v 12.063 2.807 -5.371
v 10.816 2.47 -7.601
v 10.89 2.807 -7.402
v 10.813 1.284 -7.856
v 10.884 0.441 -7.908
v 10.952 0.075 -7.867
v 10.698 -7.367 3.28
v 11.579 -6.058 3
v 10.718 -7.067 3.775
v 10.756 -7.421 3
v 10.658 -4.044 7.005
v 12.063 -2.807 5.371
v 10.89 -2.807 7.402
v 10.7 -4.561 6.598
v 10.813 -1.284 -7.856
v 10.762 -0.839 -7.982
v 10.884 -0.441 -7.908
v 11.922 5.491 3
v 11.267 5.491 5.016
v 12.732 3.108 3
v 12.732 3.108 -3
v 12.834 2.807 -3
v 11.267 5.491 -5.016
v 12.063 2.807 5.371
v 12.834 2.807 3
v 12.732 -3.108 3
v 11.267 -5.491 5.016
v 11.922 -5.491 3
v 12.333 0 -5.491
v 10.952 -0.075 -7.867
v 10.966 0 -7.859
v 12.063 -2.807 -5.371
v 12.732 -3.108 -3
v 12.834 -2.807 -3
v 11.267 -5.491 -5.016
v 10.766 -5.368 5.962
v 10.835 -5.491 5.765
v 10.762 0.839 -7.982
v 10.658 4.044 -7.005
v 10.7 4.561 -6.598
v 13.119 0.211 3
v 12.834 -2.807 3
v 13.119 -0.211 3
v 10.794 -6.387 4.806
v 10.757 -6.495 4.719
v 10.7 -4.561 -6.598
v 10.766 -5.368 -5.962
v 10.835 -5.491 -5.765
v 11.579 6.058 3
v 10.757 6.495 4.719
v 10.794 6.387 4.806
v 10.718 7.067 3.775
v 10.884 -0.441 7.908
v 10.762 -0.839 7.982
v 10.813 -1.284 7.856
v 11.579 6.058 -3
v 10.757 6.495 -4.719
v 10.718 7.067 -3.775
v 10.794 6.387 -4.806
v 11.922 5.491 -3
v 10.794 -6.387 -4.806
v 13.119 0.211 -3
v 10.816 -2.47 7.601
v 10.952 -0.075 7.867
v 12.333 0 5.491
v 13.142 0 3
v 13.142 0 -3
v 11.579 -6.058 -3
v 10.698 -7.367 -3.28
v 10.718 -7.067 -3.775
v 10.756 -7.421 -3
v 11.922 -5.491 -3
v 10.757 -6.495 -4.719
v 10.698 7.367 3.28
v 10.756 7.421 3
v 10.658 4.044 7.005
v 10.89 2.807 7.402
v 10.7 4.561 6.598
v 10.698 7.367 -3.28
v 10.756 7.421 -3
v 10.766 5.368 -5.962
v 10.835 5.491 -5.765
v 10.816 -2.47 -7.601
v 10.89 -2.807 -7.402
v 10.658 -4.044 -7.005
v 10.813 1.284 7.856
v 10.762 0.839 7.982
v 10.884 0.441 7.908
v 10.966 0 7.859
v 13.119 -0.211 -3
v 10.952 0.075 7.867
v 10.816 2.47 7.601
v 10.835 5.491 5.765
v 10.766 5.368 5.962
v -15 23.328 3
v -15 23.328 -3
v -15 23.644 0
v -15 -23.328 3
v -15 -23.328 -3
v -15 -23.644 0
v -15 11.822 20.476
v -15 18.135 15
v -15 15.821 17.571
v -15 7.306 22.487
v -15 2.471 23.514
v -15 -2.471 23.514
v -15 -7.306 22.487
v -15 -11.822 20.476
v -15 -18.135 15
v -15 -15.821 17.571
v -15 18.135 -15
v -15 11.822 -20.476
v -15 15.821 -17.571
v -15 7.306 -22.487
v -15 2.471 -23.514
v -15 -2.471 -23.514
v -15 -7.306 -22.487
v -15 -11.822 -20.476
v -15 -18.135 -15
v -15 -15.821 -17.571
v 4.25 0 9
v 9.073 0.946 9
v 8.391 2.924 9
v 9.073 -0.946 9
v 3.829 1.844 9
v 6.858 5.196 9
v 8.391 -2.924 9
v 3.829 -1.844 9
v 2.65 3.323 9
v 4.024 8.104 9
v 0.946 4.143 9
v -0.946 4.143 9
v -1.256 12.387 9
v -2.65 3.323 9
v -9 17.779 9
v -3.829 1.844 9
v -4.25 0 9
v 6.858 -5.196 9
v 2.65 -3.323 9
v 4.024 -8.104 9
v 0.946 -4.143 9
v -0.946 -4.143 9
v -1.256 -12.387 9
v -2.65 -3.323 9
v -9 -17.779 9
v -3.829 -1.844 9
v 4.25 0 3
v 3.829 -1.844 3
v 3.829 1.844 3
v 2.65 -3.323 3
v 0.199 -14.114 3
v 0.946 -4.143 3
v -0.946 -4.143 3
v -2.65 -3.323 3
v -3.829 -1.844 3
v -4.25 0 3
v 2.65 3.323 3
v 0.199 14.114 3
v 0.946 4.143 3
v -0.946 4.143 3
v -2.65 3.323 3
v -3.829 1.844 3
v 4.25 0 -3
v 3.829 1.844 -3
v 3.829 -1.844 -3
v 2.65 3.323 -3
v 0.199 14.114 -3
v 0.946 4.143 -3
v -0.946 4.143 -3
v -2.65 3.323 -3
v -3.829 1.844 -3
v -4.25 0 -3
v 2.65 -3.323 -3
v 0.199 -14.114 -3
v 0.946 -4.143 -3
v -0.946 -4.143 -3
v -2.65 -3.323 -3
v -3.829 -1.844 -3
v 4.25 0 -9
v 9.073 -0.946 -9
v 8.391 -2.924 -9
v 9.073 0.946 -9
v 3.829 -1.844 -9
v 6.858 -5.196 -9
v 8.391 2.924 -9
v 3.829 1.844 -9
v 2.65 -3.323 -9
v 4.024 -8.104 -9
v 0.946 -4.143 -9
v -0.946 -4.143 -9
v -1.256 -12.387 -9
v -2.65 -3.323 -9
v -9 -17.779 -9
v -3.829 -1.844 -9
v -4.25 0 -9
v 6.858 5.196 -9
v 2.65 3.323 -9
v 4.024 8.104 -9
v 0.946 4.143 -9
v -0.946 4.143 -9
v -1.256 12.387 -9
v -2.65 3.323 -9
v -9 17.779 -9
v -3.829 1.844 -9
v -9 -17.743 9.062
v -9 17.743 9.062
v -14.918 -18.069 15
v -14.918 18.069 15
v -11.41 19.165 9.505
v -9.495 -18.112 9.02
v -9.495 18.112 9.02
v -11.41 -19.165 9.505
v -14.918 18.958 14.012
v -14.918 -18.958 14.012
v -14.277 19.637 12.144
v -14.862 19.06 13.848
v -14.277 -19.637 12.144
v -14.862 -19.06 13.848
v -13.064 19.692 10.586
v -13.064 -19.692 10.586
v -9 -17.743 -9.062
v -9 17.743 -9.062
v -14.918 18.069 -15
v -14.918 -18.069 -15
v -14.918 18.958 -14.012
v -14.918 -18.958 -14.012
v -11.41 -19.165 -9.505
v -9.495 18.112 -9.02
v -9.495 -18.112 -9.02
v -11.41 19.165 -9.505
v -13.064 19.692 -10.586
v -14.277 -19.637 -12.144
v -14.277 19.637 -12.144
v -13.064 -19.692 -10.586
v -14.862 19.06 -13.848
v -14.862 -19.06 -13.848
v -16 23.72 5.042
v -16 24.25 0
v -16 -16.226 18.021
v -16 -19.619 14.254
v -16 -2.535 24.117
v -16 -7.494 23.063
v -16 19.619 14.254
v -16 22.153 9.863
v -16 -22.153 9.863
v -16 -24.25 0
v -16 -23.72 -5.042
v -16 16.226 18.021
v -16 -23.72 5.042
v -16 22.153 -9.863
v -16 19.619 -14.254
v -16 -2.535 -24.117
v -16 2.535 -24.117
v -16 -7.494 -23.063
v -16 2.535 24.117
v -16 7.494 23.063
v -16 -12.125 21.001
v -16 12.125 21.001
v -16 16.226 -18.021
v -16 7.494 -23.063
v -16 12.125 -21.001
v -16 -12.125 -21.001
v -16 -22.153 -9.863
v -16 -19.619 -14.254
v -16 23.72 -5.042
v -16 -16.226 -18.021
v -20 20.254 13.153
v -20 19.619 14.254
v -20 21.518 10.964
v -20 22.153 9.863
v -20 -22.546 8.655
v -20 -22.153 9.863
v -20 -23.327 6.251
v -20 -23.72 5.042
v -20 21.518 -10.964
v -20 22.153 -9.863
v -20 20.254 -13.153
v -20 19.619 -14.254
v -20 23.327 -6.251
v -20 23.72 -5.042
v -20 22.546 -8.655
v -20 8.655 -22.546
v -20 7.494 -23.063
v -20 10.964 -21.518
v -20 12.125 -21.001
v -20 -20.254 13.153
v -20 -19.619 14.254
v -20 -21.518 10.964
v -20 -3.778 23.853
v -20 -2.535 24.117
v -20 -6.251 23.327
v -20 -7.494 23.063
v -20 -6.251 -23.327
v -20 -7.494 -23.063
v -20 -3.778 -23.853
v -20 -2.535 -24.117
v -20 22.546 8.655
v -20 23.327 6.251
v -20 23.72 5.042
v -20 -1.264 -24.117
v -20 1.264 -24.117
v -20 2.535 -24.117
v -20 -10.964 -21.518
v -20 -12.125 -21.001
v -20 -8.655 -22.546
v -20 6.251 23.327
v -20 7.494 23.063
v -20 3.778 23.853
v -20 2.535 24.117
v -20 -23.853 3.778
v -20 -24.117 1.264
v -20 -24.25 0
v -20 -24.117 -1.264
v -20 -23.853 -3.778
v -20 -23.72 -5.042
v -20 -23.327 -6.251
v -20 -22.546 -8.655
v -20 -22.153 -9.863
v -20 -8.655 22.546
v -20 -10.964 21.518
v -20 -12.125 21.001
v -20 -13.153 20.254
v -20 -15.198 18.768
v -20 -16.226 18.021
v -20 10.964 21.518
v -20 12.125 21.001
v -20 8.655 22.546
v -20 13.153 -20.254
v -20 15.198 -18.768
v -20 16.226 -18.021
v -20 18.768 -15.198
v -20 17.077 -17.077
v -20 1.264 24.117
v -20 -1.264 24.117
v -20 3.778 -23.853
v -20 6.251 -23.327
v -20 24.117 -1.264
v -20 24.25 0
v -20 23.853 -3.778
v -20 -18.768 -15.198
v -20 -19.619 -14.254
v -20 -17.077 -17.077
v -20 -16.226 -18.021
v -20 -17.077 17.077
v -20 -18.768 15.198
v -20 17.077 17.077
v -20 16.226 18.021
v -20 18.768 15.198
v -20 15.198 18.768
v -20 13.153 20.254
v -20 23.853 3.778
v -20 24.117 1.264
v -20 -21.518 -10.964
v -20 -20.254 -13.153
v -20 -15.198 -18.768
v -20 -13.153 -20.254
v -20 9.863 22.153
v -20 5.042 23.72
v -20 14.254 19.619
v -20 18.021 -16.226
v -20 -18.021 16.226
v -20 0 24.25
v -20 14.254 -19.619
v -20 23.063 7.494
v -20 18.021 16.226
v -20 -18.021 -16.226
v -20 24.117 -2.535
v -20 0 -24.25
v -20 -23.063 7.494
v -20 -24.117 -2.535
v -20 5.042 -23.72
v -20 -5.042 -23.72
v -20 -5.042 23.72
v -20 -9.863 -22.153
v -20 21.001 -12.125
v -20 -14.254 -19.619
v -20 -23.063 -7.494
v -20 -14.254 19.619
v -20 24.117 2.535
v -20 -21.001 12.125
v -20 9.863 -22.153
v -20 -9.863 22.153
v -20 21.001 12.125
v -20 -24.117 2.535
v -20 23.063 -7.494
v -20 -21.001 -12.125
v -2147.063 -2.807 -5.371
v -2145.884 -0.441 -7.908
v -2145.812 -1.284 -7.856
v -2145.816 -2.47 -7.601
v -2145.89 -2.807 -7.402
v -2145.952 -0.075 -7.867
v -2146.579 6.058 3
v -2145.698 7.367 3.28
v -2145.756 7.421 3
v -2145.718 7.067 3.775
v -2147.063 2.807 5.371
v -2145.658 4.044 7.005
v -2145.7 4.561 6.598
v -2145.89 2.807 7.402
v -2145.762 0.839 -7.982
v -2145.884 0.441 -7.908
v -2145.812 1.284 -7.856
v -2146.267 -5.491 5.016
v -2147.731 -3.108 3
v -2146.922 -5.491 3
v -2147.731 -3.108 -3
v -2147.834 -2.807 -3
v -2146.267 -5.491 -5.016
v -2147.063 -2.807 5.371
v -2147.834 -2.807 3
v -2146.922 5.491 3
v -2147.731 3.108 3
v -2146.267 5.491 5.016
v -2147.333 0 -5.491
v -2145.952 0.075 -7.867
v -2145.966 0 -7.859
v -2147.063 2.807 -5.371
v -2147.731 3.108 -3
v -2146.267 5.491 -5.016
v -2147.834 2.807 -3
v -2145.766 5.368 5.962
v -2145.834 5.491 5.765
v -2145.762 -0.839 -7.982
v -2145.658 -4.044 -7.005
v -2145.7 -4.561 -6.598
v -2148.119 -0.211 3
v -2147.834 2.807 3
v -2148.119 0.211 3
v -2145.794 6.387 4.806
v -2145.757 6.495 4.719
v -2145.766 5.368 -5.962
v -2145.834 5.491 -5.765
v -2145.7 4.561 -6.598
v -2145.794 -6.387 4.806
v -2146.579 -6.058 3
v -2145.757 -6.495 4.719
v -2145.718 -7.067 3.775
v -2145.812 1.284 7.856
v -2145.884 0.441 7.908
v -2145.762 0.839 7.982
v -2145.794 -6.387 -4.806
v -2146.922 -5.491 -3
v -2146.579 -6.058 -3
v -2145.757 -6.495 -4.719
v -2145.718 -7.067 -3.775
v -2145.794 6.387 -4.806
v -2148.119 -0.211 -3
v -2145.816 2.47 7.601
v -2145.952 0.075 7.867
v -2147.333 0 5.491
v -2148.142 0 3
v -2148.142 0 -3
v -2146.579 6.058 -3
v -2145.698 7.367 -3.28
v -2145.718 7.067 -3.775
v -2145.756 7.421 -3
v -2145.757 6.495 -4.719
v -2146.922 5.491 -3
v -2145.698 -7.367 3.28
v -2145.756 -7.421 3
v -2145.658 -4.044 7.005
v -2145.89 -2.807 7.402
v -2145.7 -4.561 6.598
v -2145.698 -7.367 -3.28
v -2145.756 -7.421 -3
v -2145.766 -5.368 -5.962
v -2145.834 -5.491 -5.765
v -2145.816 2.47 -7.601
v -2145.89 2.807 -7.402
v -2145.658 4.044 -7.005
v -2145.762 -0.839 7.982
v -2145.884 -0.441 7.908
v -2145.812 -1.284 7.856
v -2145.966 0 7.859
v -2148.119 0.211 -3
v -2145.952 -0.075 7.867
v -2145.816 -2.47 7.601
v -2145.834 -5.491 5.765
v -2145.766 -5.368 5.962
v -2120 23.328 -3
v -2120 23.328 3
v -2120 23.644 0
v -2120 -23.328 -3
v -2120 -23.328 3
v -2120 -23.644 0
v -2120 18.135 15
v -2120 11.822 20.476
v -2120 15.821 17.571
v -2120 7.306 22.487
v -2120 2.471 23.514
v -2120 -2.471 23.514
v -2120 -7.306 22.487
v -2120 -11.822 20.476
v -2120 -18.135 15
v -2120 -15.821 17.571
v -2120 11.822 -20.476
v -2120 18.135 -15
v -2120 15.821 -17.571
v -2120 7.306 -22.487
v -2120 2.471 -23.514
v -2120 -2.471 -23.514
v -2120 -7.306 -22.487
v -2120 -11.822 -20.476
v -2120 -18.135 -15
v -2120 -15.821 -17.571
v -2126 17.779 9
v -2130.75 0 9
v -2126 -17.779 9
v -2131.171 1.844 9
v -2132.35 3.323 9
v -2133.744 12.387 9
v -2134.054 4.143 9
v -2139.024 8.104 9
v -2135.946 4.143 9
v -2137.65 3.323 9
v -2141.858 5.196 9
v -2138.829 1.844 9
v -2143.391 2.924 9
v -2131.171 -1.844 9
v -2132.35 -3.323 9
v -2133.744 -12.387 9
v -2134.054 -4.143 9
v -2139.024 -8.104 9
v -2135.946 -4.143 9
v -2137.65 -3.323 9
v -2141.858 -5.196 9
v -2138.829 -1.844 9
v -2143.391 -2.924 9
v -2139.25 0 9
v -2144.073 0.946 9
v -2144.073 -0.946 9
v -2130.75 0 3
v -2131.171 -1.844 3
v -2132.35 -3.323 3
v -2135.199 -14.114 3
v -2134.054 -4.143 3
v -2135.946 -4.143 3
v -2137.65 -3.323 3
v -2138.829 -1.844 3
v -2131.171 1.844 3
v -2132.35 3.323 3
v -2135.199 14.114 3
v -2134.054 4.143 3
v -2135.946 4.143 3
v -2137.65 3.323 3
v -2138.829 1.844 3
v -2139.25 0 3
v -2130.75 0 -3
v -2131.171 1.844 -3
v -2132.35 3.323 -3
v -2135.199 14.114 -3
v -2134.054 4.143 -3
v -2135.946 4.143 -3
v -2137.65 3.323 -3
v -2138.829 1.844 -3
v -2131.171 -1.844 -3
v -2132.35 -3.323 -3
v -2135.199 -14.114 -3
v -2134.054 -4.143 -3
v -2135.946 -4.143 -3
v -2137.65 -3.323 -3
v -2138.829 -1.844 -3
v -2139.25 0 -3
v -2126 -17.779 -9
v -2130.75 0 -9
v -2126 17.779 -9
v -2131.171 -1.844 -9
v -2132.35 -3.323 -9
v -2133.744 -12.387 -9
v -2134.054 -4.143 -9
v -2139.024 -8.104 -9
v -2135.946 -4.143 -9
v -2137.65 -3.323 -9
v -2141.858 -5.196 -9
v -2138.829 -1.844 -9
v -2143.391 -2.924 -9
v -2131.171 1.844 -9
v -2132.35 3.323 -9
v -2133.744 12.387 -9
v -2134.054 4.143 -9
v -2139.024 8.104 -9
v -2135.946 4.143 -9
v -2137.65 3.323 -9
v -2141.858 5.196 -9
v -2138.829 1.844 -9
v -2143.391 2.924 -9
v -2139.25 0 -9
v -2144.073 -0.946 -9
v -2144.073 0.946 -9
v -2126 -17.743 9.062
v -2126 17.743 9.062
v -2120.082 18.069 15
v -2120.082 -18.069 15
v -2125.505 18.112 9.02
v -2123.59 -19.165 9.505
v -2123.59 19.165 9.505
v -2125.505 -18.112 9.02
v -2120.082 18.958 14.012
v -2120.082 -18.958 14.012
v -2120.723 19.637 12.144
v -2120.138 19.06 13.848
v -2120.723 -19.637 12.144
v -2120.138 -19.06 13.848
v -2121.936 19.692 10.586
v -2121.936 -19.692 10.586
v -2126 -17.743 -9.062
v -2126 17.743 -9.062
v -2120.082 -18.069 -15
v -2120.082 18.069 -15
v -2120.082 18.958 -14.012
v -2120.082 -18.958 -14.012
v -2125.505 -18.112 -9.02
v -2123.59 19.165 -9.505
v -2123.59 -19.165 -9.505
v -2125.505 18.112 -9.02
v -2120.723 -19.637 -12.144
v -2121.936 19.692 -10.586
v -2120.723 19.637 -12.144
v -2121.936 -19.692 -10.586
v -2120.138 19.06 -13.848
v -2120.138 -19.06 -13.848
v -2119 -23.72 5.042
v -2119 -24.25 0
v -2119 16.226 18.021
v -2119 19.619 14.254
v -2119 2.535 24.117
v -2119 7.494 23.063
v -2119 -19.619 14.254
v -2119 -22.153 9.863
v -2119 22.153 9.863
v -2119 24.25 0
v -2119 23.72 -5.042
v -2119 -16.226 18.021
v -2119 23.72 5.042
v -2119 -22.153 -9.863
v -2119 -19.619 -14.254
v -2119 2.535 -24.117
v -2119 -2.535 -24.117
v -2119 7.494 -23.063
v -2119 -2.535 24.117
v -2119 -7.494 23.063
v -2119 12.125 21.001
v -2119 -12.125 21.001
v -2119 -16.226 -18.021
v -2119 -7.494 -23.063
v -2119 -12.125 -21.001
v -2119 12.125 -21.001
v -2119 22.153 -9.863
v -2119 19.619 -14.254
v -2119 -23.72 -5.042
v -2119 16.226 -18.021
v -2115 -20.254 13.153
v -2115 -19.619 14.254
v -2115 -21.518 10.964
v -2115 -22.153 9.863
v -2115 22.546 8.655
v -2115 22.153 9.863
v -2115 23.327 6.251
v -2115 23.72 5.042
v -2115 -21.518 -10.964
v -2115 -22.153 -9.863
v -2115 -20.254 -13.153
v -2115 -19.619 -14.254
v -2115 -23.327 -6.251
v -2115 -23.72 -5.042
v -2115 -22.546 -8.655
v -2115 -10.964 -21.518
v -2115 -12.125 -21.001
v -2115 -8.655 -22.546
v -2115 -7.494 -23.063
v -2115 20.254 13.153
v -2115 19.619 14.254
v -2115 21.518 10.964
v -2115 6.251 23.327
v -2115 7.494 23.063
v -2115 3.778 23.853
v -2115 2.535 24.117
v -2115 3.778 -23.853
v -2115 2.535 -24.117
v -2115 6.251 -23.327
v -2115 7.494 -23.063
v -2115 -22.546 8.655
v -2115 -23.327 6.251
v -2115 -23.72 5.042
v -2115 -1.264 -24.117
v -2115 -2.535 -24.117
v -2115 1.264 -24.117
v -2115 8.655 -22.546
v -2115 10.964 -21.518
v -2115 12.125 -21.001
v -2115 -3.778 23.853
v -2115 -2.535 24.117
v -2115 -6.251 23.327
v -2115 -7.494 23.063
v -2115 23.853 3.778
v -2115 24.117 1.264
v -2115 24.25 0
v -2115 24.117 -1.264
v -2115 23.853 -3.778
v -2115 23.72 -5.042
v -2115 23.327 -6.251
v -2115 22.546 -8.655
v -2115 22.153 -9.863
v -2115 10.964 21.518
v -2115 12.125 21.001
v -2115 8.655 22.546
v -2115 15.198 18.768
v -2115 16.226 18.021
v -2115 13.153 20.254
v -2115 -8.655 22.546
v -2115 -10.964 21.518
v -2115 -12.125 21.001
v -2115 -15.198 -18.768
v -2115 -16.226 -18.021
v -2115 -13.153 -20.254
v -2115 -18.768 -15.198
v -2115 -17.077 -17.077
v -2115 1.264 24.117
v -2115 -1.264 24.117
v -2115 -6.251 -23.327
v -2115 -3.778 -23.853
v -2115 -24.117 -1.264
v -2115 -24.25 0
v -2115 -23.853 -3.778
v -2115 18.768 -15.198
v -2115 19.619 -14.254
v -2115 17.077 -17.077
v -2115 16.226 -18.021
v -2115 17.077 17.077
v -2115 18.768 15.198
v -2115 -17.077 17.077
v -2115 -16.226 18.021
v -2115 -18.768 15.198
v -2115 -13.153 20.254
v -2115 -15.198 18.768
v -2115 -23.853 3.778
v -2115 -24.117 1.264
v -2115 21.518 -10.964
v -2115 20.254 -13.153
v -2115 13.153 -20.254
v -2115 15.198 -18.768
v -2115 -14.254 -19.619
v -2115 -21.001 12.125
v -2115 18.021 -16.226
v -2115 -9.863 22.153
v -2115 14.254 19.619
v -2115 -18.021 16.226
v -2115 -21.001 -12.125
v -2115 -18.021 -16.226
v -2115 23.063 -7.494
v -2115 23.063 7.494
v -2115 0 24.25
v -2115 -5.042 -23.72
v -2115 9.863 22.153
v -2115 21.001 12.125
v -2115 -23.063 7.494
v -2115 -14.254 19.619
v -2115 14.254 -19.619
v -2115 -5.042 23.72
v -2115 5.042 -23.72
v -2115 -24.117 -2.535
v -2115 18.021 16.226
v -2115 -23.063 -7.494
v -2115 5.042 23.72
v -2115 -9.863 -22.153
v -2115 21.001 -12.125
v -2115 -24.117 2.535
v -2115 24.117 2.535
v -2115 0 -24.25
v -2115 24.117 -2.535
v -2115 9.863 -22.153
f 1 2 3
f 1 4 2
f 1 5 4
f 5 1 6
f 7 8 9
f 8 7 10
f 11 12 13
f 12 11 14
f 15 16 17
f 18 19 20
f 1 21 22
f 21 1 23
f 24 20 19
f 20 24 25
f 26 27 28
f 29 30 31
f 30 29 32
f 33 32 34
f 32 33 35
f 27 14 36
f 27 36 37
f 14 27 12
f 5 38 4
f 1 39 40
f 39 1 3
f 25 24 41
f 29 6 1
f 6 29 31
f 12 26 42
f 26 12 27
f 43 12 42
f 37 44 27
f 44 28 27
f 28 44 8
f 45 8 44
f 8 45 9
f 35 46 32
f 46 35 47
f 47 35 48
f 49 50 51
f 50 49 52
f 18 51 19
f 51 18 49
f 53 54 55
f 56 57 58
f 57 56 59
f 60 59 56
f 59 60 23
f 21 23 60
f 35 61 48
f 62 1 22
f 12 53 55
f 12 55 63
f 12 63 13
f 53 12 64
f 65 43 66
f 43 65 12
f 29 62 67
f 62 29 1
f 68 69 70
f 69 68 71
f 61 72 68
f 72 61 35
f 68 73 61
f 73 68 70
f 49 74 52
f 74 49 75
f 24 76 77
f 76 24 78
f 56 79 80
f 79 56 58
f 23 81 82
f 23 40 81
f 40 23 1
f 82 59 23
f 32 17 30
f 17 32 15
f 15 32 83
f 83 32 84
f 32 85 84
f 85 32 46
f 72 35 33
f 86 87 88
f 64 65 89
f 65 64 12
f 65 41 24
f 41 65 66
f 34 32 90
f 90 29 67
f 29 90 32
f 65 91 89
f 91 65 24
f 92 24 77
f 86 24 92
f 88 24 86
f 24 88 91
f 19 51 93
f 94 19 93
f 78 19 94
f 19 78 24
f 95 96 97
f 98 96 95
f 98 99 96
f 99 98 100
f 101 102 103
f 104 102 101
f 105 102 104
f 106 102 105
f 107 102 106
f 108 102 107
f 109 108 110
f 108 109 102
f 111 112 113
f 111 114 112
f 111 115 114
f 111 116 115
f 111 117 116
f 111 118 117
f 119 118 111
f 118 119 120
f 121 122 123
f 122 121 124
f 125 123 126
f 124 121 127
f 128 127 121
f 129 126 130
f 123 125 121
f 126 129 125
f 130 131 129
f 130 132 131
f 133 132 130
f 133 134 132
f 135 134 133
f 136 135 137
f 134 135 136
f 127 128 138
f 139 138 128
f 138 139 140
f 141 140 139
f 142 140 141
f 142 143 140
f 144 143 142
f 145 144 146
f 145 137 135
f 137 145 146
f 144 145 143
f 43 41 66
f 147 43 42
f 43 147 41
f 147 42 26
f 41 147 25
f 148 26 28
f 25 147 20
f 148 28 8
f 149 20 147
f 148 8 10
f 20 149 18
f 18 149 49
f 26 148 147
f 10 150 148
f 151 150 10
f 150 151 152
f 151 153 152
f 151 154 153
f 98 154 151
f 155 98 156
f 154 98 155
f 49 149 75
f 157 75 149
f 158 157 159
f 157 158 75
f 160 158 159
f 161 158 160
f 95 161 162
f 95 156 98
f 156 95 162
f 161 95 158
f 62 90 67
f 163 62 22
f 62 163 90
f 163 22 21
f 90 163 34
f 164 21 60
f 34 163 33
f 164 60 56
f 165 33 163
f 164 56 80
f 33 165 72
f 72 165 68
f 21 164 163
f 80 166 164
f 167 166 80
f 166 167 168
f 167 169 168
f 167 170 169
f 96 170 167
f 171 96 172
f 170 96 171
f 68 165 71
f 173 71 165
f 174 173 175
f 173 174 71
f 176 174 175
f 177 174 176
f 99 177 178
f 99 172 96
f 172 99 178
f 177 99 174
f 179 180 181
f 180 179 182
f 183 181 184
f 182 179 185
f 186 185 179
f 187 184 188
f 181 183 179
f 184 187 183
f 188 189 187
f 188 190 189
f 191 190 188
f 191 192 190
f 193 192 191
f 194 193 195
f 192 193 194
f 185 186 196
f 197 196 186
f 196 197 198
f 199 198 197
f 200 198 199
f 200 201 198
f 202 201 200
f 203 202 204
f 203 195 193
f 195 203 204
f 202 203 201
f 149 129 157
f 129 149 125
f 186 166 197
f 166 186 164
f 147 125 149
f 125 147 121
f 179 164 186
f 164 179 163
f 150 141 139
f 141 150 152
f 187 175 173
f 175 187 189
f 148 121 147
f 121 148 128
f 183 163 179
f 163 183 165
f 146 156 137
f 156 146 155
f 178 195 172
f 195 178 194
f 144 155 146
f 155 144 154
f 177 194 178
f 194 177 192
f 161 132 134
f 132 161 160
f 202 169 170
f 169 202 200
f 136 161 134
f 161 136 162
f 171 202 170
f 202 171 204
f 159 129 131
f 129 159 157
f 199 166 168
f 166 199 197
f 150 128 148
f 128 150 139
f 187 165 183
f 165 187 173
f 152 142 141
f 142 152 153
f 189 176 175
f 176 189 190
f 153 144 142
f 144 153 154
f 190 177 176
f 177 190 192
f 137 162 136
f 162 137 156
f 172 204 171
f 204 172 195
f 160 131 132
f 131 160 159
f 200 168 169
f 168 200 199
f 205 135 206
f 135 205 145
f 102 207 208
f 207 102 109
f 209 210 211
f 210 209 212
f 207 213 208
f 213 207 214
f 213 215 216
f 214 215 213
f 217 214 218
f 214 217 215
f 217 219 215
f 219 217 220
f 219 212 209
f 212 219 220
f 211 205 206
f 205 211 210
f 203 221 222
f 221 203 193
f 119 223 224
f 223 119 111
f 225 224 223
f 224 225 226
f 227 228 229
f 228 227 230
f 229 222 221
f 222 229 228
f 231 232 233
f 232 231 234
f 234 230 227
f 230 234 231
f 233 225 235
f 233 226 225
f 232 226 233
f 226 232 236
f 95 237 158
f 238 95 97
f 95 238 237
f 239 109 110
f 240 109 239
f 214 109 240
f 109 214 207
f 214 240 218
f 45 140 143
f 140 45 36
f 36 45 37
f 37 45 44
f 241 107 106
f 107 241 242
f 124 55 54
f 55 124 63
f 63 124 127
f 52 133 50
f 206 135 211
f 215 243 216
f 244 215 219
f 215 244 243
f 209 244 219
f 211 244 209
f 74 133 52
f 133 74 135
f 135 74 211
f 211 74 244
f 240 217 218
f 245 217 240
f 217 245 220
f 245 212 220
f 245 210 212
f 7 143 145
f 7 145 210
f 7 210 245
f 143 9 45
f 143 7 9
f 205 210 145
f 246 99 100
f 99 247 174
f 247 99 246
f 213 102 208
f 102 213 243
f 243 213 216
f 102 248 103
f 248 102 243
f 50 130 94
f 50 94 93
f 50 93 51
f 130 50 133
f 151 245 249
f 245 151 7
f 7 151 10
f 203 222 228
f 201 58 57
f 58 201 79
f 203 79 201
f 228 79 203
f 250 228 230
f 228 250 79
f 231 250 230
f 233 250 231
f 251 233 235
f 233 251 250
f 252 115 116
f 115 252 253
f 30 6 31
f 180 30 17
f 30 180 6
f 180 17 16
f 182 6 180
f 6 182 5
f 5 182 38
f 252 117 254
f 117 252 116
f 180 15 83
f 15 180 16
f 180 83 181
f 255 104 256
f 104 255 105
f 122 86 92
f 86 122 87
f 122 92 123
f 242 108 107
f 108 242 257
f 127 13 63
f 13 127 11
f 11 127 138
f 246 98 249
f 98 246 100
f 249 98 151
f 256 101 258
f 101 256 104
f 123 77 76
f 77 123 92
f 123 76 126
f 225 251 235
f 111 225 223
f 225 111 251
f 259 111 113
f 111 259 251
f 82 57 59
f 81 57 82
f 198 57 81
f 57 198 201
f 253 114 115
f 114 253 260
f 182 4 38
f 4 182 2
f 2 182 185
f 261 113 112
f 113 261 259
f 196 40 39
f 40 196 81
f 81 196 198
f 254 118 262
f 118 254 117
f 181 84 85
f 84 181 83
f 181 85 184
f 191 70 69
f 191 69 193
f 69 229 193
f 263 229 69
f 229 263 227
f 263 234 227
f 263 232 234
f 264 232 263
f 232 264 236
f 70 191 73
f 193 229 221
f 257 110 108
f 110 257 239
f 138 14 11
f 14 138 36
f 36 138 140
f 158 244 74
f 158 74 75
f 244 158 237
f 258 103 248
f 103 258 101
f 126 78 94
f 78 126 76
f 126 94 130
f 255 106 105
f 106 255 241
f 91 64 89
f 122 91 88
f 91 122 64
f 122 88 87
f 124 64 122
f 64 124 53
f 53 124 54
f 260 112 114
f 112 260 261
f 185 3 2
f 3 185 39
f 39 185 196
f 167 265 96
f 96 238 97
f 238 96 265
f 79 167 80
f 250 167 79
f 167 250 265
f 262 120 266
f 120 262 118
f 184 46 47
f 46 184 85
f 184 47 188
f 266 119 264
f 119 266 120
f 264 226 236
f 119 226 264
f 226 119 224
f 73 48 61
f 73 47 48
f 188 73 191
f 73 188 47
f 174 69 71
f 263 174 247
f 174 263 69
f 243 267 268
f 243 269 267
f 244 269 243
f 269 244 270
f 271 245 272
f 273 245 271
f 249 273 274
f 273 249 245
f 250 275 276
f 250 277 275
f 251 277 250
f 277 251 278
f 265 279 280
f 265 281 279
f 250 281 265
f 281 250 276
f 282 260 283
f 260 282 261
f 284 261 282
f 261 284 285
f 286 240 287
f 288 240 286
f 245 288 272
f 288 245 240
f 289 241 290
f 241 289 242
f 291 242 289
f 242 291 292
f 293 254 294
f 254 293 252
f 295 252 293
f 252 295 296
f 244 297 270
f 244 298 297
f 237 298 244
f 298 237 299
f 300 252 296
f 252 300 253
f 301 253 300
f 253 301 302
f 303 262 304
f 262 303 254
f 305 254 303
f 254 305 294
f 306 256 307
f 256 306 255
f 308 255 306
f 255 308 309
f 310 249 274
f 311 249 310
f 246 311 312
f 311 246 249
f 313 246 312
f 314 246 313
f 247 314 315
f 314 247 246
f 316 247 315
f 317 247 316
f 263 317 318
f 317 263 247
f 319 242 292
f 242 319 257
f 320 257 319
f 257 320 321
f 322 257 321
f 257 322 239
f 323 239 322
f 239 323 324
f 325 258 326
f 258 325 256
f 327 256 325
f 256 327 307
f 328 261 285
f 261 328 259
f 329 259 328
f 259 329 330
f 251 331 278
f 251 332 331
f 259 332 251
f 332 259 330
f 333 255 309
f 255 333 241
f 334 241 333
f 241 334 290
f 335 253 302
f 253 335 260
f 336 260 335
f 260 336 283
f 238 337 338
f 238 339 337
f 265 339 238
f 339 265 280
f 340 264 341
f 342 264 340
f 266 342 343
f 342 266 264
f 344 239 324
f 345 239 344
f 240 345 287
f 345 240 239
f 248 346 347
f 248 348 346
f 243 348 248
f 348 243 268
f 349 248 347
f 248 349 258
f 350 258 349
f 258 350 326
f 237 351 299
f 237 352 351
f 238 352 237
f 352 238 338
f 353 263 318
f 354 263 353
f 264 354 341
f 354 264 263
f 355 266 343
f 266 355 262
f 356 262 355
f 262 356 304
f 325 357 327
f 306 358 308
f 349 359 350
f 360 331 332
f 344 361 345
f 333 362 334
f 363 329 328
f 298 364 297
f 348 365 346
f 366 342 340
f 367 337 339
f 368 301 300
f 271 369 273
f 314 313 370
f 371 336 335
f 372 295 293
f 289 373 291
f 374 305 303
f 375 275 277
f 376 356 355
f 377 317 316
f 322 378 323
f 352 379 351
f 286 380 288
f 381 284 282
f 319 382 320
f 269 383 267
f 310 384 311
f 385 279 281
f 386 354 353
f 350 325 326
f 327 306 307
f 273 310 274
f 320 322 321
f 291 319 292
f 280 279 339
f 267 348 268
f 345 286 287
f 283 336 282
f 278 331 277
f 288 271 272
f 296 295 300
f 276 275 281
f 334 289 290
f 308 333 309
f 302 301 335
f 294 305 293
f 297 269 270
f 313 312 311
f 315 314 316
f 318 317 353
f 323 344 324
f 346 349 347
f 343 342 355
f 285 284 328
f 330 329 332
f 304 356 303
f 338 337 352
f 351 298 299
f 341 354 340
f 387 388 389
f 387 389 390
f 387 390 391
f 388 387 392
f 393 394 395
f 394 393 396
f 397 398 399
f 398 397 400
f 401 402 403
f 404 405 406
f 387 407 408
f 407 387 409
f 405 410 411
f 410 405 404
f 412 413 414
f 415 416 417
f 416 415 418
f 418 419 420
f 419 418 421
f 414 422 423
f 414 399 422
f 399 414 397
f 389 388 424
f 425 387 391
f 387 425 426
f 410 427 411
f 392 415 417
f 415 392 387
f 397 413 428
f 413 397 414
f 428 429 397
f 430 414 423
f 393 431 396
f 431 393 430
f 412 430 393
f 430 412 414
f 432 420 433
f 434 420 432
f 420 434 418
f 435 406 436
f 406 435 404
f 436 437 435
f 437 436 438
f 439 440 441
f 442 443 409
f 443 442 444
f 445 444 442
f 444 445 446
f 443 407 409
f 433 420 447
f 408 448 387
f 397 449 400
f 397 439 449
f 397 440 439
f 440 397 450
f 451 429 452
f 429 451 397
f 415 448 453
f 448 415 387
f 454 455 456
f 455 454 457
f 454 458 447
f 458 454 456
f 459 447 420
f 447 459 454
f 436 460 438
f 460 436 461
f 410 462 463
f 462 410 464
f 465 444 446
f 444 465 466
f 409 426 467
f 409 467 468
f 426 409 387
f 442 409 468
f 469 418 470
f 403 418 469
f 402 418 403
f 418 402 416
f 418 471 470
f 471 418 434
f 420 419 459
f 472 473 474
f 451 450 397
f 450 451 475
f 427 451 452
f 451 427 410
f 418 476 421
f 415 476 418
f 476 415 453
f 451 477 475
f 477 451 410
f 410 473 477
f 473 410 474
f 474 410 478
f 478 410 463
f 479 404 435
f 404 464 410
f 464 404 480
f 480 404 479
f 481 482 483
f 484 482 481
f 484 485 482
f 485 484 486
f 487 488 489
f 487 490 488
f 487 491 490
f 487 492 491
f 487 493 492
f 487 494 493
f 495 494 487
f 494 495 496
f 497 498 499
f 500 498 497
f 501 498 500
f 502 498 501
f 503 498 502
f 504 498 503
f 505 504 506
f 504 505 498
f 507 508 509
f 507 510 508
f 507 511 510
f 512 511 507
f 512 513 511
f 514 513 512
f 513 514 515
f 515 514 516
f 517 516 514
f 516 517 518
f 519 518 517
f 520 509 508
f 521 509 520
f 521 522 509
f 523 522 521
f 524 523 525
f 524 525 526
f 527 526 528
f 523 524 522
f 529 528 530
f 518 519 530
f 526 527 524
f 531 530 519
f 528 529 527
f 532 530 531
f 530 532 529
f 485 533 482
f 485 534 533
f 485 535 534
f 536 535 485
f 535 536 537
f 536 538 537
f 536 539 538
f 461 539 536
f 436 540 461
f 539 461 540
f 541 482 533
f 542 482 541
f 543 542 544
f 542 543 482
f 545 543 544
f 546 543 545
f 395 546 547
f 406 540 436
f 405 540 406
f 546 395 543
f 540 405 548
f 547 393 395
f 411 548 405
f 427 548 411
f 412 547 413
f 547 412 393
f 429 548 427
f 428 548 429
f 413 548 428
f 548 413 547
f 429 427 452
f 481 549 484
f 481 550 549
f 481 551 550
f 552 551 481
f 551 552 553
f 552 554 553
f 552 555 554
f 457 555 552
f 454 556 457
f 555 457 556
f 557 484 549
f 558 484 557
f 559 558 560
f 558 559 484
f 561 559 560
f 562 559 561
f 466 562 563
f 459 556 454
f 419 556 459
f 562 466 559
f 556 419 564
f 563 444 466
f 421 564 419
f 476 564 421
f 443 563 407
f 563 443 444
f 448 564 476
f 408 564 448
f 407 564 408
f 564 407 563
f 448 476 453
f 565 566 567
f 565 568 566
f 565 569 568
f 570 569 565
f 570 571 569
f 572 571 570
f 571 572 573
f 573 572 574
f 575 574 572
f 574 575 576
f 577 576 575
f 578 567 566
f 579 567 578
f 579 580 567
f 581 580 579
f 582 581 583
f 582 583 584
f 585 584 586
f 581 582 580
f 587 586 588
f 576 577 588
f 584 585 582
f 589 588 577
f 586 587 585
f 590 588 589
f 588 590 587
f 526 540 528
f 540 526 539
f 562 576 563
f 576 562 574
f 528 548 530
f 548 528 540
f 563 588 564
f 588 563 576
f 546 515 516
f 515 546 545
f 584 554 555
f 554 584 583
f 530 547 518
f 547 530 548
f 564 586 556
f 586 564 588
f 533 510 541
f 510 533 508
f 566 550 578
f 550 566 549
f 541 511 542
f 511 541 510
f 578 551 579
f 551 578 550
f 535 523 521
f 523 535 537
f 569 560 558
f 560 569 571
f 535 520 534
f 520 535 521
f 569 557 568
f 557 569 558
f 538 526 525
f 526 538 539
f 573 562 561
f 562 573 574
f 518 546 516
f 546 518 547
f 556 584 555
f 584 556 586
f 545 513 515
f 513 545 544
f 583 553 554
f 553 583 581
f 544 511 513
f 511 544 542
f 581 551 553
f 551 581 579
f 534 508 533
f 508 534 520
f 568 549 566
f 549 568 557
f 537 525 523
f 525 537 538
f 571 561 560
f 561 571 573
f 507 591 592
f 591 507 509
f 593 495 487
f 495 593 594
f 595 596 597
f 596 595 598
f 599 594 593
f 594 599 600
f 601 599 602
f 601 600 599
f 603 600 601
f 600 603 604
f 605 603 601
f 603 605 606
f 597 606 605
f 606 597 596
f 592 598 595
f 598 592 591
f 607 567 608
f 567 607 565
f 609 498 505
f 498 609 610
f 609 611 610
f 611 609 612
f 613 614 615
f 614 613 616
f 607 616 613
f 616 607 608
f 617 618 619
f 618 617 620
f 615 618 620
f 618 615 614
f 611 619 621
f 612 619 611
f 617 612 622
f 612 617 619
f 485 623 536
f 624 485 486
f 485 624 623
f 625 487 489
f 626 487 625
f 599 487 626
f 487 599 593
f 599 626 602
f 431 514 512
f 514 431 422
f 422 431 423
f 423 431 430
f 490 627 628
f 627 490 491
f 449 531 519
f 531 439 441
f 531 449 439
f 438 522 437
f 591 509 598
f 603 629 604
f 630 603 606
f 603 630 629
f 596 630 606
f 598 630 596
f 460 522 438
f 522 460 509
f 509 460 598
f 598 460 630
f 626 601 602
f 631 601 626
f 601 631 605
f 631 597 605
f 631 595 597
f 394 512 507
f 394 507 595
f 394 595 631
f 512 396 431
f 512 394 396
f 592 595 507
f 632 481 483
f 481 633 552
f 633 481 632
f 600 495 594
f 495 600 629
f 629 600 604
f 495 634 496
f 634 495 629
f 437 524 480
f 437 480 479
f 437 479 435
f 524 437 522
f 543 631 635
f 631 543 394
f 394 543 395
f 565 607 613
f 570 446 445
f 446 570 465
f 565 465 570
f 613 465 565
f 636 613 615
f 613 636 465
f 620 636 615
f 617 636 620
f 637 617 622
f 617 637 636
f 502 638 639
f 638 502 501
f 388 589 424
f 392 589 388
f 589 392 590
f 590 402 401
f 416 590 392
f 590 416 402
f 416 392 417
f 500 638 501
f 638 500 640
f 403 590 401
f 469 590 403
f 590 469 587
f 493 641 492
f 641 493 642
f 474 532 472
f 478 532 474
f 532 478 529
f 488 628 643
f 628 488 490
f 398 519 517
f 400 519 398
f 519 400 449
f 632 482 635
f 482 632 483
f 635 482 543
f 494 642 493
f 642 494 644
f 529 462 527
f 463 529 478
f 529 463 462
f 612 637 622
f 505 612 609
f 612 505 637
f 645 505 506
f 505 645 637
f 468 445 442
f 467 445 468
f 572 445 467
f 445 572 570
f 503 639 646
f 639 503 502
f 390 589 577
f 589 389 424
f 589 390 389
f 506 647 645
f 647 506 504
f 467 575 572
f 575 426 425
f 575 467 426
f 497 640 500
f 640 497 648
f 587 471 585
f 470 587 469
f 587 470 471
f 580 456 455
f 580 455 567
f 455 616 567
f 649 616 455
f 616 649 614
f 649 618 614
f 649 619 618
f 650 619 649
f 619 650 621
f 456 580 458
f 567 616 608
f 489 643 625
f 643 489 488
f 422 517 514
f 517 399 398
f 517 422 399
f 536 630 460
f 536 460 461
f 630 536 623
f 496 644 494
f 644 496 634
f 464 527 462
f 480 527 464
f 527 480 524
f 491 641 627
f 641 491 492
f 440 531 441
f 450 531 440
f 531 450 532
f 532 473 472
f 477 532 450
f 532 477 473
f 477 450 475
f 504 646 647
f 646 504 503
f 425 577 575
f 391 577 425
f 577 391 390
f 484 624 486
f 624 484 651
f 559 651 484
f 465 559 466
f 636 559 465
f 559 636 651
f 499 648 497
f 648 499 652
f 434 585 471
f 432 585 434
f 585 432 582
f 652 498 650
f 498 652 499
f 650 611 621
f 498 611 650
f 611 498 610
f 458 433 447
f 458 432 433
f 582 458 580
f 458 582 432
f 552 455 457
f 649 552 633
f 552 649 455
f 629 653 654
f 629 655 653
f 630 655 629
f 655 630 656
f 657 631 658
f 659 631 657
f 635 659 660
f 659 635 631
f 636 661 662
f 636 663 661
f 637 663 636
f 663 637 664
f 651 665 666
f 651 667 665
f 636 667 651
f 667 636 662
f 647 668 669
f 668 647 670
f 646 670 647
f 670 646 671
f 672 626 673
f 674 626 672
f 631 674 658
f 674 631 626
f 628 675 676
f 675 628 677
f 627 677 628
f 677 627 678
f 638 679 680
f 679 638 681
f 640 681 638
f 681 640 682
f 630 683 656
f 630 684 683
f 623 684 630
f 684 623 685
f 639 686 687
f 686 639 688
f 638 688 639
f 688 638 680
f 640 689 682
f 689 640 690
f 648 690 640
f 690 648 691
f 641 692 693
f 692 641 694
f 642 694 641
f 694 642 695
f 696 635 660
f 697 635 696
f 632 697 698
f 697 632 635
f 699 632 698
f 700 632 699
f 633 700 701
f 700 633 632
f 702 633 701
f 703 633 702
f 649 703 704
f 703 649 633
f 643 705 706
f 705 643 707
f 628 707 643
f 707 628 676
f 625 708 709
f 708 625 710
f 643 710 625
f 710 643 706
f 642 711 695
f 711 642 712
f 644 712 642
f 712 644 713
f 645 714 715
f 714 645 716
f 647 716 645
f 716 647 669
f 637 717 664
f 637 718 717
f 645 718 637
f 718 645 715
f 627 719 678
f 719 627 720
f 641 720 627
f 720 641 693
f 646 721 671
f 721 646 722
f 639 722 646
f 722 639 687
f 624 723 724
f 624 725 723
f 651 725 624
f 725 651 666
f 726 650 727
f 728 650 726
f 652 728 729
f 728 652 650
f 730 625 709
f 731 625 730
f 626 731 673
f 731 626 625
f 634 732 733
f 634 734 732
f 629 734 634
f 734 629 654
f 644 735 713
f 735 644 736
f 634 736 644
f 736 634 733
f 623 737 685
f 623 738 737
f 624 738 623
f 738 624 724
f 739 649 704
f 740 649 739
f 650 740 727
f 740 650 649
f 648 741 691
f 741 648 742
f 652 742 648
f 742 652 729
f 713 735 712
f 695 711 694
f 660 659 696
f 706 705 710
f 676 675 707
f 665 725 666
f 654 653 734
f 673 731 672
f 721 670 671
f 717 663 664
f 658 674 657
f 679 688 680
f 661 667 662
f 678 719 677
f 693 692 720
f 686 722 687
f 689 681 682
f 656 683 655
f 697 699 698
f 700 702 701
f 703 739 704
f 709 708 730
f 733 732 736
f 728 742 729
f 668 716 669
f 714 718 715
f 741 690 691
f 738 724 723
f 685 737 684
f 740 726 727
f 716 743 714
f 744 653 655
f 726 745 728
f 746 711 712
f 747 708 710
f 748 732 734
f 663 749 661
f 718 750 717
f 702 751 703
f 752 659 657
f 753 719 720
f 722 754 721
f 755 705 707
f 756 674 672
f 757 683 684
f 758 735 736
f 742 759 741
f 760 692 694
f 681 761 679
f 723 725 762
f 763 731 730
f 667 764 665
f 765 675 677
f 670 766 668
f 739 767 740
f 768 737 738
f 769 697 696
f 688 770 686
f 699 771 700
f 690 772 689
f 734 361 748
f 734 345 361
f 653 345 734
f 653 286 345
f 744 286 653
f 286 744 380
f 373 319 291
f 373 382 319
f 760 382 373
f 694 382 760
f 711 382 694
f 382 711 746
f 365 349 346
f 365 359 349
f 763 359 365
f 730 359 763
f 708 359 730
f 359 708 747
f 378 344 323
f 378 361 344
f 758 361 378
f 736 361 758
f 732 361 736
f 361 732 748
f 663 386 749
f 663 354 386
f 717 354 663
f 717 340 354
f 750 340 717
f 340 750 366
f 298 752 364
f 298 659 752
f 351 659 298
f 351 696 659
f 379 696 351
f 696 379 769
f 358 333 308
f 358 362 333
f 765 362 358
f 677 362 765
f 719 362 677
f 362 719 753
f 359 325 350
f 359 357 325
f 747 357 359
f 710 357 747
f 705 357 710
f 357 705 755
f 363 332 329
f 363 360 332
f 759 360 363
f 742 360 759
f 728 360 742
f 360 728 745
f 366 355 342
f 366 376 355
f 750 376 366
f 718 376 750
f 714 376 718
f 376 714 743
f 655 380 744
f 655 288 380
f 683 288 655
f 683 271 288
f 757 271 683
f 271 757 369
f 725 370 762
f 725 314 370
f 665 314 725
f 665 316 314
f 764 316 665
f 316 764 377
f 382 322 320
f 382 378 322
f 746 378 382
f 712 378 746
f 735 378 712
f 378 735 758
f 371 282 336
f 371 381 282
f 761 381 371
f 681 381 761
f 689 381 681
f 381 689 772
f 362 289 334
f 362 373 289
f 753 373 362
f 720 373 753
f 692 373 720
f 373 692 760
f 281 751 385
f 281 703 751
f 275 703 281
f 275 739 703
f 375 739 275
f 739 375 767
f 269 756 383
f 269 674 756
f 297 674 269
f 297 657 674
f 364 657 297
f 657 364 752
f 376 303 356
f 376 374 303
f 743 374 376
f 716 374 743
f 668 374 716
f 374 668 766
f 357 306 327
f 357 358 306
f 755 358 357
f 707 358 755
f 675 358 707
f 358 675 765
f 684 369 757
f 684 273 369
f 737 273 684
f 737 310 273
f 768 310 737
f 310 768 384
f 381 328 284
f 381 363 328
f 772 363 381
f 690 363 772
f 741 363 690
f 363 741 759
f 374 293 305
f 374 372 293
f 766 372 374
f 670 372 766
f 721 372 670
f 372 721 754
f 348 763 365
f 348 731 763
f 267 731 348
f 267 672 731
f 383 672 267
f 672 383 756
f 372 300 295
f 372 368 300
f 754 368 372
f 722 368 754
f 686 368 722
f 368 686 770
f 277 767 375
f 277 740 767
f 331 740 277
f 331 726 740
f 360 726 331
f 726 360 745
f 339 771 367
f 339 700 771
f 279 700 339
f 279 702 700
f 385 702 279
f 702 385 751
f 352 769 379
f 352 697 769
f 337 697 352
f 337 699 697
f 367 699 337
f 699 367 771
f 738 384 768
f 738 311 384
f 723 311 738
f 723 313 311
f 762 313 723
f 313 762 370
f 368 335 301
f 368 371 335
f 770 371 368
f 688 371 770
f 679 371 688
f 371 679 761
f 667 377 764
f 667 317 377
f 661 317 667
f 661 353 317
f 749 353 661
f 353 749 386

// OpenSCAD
// file: ../Parts/ShplRoz.scad
ShplRoz();

    gikLen = 2200;
    diamVnesh = 48.5;
    platformThickns = 5;
    ushiThickns = 6;
    lenA = 40;
    shplintDia = 8.5;
    shplintHoleHeight = 15;

module ShplRoz() {

    intersection() {
        
        union() {
            
            //Цилиндр
            translate([+platformThickns-1,0,0]) 
            rotate([0,-90,0]) 
            cylinder(h=shplintHoleHeight+platformThickns, d=diamVnesh);   // Эта часть такая, какая нужна.    

            // Сфера
            sphere(d = ushiThickns*4.5);
       } 

       ConicBar();

    }

    //Цилиндр затычки, высотой 4мм 
    translate([-shplintHoleHeight-1,0,0]) 
    rotate([0,-90,0]) 
    cylinder(h=platformThickns-1, d=diamVnesh);    

}




module ConicBar() {
    
    intersection() { 

        union() {
                                        
            // Шайба 1мм
            translate([-shplintHoleHeight,0,0]) 
            rotate([0,-90,0]) 
            cylinder(h=1, d=diamVnesh);
    
            // Захваты упора с дырками.
            difference(){ 
                    
                // Захваты упора.
                union() {  
                    translate([-shplintHoleHeight,ushiThickns /2 ,-diamVnesh/2]) 
                    cube([lenA,ushiThickns ,diamVnesh]);    

                    translate([-shplintHoleHeight,-3*ushiThickns /2 ,-diamVnesh/2]) 
                    cube([lenA,ushiThickns ,diamVnesh]);
                        
                }
                    
                // Дырки для шплинта ( вырез цилиндра )
                translate([0 ,-1-ushiThickns*3/2,0]) 
                rotate([-90,0,0]) 
                cylinder(h=ushiThickns *3+2, d=shplintDia); 

            }
        
            // Стыки
            difference() {

                translate([-shplintHoleHeight,3*ushiThickns /2 ,-diamVnesh/2]) 
                cube([ushiThickns,ushiThickns ,diamVnesh]);    

                translate([-shplintHoleHeight + ushiThickns,5*ushiThickns/2,-diamVnesh/2]) 
                rotate([0,0,0]) 
                cylinder(h=diamVnesh, d=ushiThickns*2  );       
            }
            difference() {

                translate([-shplintHoleHeight,-5*ushiThickns /2 ,-diamVnesh/2]) 
                cube([ushiThickns,ushiThickns ,diamVnesh]);      

                translate([-shplintHoleHeight + ushiThickns,-5*ushiThickns/2,-diamVnesh/2]) 
                rotate([0,0,0]) 
                cylinder(h=diamVnesh, d=ushiThickns*2  );       
            }   
        
        }

        // Конус. Нужно оставить то, что в нём.
        translate([-shplintHoleHeight-1,0,0]) 
        rotate([0,90,0]) 
        cylinder(h=platformThickns*8, d1=diamVnesh, d2=0);   // Пересекаем с этим конусом.
   
    } // Пересечение
}   // Модуль ConicBar
// main file
use <../Parts/ShplRoz.scad>;


    legLen = 2095;
    holeOffset = 20;

    diamVnesh = 48.5;
/*
    platformThickns = 5;
    ushiThickns = 6;
    lenA = 40;
    shplintDia = 8.5;
    shplintHoleHeight = 15;
*/





//translate([legLen+holeOffset,0,0]) 
PyraFL();


module PyraFL() {
    
//    $fn = 50;
    
    translate([-holeOffset,0,0]) rotate([0,-90,0]) cylinder(h=legLen, d=diamVnesh);        
    rotate([90,0,0]) ShplRoz();
    translate([-holeOffset*2-legLen,0,0]) rotate([90,0,180]) ShplRoz();


}
